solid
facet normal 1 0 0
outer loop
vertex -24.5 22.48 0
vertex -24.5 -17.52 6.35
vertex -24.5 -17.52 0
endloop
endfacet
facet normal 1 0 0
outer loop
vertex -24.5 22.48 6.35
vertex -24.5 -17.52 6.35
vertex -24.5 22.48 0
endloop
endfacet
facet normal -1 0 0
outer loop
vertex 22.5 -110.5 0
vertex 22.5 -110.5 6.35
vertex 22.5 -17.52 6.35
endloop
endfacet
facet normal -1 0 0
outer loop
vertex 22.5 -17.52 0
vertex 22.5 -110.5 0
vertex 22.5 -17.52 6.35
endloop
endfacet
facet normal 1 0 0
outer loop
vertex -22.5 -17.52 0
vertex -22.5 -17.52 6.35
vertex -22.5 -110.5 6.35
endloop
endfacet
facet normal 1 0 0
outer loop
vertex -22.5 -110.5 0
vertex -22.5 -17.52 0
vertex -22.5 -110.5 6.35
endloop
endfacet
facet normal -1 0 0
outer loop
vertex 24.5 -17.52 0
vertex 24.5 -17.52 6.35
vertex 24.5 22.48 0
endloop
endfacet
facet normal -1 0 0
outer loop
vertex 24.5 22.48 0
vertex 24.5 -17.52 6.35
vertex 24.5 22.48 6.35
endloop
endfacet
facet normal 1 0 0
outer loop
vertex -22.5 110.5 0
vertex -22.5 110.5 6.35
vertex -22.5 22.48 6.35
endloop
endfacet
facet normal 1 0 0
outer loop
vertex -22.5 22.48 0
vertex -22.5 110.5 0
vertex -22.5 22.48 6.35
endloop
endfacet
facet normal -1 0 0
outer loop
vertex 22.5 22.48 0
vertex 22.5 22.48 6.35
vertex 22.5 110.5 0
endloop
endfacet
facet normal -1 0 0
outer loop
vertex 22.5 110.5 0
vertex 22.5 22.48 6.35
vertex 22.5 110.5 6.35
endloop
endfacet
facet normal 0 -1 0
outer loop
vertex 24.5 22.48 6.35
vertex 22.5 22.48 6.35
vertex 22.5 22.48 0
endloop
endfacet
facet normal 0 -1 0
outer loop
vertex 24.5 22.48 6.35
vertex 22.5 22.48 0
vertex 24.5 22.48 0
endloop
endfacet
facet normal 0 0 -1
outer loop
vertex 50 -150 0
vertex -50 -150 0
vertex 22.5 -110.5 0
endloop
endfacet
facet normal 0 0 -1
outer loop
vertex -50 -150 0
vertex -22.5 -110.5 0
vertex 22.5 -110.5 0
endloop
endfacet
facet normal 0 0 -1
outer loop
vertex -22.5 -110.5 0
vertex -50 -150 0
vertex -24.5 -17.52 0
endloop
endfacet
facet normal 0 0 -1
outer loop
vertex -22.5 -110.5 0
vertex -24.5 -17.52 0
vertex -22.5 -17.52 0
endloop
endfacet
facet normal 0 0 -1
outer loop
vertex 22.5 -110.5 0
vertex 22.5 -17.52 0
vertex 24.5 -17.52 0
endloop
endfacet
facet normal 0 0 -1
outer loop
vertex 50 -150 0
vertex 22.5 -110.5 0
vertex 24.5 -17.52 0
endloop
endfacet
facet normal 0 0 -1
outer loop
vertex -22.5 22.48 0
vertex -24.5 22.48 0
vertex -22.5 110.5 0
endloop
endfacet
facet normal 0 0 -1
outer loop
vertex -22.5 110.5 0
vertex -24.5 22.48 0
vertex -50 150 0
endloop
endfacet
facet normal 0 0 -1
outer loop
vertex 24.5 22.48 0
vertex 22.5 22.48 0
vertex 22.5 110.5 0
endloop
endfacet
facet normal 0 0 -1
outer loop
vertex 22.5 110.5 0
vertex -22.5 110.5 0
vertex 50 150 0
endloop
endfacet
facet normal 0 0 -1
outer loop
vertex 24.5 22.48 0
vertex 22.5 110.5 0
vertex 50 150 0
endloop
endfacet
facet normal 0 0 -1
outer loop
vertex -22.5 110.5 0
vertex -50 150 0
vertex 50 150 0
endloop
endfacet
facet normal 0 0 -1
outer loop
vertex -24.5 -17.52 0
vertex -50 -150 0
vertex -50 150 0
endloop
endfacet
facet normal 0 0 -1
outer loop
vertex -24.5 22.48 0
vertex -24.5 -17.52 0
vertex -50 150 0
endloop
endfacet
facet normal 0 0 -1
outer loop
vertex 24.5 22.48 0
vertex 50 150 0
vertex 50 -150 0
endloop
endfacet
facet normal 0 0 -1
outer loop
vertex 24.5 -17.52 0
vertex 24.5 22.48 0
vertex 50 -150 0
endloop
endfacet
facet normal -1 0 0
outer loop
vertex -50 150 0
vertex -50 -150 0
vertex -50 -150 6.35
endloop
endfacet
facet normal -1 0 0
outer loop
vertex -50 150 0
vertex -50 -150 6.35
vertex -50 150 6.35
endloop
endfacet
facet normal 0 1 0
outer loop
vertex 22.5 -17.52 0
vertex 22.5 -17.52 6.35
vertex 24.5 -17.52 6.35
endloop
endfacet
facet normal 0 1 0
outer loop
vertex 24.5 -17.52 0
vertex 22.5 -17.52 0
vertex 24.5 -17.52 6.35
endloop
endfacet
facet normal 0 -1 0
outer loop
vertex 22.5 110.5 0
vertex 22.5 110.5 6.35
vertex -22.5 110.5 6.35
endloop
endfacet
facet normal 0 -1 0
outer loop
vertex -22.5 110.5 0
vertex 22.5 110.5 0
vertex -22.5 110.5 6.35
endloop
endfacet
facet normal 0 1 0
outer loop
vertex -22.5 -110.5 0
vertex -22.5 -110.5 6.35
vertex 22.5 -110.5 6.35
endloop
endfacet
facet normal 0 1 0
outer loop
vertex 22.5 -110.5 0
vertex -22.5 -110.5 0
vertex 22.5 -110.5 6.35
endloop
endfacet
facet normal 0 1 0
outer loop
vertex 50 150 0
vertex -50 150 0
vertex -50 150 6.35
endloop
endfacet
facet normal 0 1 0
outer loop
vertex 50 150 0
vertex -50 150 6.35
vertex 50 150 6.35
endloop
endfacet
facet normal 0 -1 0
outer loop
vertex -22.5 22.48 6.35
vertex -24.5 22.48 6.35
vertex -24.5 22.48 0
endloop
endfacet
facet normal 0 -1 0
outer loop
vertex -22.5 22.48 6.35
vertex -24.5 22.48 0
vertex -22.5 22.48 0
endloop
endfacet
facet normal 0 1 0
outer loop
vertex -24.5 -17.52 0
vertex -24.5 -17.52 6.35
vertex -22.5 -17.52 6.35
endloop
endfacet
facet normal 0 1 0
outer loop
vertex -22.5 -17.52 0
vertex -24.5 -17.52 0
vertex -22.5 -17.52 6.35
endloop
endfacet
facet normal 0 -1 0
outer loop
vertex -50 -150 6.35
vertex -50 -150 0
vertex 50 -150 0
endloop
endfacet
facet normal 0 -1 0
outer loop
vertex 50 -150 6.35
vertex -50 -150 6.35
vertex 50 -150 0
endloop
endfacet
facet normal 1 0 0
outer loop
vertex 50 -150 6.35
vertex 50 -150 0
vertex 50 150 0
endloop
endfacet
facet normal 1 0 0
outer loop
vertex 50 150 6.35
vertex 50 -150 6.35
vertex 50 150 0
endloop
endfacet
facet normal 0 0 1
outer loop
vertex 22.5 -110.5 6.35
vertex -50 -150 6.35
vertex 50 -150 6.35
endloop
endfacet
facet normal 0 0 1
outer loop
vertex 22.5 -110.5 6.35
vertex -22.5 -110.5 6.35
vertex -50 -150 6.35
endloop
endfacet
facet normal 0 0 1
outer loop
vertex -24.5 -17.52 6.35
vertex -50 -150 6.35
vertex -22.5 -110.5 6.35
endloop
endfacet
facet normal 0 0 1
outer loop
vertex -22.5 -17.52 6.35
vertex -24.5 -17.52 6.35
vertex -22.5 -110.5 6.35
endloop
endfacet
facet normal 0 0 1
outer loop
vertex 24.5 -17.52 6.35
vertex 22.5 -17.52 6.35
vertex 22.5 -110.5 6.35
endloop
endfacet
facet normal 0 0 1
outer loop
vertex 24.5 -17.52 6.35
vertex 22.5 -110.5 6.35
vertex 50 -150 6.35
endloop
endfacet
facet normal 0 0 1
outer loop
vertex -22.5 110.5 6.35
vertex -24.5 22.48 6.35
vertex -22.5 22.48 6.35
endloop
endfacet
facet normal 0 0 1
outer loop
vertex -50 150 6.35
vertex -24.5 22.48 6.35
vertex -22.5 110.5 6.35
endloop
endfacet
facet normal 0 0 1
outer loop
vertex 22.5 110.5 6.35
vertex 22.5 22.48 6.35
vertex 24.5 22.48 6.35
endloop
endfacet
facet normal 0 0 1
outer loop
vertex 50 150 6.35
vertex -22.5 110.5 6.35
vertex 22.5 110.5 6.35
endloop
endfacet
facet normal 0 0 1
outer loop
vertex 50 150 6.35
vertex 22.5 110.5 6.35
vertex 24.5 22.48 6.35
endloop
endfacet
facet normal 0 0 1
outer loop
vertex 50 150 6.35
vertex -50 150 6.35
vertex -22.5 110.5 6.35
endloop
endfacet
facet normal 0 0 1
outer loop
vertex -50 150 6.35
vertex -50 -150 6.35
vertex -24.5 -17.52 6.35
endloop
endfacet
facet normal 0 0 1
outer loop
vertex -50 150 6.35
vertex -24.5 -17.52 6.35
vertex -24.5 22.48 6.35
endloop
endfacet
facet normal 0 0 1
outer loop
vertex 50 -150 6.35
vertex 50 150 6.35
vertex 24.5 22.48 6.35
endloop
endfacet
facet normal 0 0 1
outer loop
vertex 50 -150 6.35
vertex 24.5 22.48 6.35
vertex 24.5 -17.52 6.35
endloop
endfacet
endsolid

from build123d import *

# Parameters (mm, degrees)
F0_W     = 100
F0_H     = 300
F1_DEPTH = 6.35
F2_W     = 2
F2_H     = 40
F3_DEPTH = 25.4


# Not quite as in the source:
# - a length typed as a fraction of an inch, garbled in the dataset ("3 / 203.2 mm" for 3/8 in), is restored


with BuildPart() as f1:
    # F0 (on Top) → F1 (new body)
    with BuildSketch(Plane.XY):
        Rectangle(F0_W, F0_H)
    extrude(amount=F1_DEPTH)

    # F2 (on face) → F3 (cut)
    with BuildSketch(Plane.XY.offset(6.35)):
        Polygon((22.5, 22.48), (22.5, 110.5), (-22.5, 110.5), (-22.5, 22.48), (-22.5, -17.52), (-22.5, -110.5), (22.5, -110.5), (22.5, -17.52), align=None)
        with Locations((23.5, 2.48)):
            Rectangle(F2_W, F2_H)
        with Locations((-23.5, 2.48)):
            Rectangle(F2_W, F2_H)
    extrude(amount=-F3_DEPTH, mode=Mode.SUBTRACT)


solid = f1.part
